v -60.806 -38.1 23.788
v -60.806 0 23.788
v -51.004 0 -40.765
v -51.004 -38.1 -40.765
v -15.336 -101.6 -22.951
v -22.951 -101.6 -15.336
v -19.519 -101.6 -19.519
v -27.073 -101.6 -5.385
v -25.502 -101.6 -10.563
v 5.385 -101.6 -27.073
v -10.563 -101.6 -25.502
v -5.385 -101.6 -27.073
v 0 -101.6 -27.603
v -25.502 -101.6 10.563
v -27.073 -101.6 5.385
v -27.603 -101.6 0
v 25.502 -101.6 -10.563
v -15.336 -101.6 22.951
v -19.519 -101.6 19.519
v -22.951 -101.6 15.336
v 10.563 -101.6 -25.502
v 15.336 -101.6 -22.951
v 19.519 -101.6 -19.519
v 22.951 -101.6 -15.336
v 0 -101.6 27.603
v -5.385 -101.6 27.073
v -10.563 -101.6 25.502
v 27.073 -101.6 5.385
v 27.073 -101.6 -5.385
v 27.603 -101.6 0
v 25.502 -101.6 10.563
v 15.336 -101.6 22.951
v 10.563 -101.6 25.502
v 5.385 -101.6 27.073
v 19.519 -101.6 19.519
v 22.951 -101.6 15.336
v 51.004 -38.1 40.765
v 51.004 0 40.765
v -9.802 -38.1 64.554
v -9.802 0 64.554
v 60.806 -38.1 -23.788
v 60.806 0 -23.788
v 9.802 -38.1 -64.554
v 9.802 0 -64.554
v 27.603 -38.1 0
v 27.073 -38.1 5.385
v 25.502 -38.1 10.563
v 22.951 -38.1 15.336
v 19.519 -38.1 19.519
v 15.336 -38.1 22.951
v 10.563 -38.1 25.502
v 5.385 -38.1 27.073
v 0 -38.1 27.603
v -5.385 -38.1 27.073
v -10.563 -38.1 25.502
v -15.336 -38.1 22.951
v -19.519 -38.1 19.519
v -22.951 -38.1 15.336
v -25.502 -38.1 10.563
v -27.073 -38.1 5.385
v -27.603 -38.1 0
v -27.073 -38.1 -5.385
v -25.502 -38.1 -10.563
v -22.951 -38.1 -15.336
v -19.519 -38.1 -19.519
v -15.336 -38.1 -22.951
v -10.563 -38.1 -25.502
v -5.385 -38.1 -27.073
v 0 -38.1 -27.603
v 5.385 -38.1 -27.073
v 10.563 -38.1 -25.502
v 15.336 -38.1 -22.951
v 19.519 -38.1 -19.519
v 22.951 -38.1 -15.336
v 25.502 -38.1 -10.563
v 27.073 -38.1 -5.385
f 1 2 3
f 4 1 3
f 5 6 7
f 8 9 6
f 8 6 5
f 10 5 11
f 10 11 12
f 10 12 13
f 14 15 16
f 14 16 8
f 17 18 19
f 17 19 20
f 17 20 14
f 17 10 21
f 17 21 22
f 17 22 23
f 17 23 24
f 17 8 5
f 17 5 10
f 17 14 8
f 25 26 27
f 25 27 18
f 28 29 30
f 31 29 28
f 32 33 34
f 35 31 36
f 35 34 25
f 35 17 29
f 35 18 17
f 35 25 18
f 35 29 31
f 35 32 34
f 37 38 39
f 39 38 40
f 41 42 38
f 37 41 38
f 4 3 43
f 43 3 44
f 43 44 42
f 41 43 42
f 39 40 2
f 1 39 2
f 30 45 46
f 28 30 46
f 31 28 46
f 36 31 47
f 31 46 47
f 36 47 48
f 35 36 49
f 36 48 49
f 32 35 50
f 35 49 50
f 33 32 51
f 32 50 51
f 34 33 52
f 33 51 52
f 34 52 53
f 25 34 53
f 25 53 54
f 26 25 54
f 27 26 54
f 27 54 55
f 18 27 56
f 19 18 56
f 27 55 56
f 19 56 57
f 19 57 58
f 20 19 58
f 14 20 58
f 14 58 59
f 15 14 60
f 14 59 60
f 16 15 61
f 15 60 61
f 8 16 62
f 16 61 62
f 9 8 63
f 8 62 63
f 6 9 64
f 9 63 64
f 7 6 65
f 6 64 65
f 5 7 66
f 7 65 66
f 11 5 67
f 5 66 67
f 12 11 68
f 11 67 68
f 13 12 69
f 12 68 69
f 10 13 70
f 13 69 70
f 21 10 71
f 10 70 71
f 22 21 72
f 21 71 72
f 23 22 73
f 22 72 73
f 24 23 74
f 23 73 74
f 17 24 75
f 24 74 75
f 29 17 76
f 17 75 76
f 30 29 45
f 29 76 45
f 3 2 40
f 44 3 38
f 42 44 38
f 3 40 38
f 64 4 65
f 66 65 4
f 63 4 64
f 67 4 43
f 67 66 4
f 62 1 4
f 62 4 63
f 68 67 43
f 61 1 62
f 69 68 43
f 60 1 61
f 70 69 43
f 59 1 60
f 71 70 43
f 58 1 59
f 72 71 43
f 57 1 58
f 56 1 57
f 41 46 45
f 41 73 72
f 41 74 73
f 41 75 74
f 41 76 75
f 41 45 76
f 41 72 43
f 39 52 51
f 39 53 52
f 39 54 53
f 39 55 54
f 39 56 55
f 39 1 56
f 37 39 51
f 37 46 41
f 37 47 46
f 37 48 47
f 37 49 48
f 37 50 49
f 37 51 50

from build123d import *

# Parameters (mm, degrees)
F1_DEPTH = 38.1
F2_R     = 27.603374
F3_DEPTH = 63.5


with BuildPart() as f1:
    # F0 (on Front) → F1 (new body)
    with BuildSketch(Plane.XZ):
        Polygon((51.004349, 40.765317), (-9.801625, 64.553721), (-60.805975, 23.788404), (-51.004349, -40.765317), (9.801625, -64.553721), (60.805975, -23.788404), align=None)
    extrude(amount=F1_DEPTH)

    # F2 (on face) → F3 (join)
    with BuildSketch(Plane.XZ.offset(38.1)):
        Circle(F2_R)
    extrude(amount=F3_DEPTH)


solid = f1.part
